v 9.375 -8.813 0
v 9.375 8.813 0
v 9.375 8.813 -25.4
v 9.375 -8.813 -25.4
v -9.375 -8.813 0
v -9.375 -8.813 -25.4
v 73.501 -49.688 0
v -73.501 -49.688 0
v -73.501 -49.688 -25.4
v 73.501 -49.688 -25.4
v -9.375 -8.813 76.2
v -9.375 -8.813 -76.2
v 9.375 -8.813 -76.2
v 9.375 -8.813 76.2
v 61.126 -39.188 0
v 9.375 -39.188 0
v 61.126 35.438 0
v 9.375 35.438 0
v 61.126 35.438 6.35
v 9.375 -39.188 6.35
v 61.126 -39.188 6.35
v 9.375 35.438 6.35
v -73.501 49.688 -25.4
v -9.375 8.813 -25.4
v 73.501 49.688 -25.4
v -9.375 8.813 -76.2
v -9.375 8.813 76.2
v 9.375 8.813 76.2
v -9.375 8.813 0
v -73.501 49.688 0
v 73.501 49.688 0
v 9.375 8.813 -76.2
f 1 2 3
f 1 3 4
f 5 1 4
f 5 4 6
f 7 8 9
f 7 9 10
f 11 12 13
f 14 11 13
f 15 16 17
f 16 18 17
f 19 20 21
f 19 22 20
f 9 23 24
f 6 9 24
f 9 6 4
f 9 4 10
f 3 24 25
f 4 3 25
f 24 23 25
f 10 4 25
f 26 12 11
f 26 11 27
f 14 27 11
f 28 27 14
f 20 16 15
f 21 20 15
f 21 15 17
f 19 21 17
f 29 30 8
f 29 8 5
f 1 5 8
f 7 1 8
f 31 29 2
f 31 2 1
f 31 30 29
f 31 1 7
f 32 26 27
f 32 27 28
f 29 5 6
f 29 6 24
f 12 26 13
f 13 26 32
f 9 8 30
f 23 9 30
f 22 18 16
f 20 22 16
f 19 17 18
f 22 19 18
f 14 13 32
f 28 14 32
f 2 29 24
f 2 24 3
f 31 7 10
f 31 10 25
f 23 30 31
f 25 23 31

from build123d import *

# Parameters (mm, degrees)
F0_W     = 147.001236
F0_H     = 99.37583
F1_DEPTH = 25.4
F0_W_2   = 18.750162
F0_H_2   = 17.62514
F2_DEPTH = 76.2
F3_DEPTH = 6.35


with BuildPart() as f1:
    # F0 (on Top) → F1 (new body)
    with BuildSketch(Plane.XY):
        Rectangle(F0_W, F0_H)
        Polygon((9.375081, -39.187826), (9.375081, -8.81257), (-9.375081, -8.81257), (-9.375081, 8.81257), (9.375081, 8.81257), (9.375081, 35.4378), (61.125513, 35.4378), (61.125513, -39.187826), align=None, mode=Mode.SUBTRACT)
        Polygon((9.375081, 8.81257), (9.375081, -8.81257), (9.375081, -39.187826), (61.125513, -39.187826), (61.125513, 35.4378), (9.375081, 35.4378), align=None)
    extrude(amount=-F1_DEPTH)


with BuildPart() as f2:
    # F0 (on Top) → F2 (new body, symmetric)
    with BuildSketch(Plane.XY):
        Rectangle(F0_W_2, F0_H_2)
    extrude(amount=F2_DEPTH, both=True)


with BuildPart() as f3:
    # F0 (on Top) → F3 (new body)
    with BuildSketch(Plane.XY):
        Polygon((9.375081, 8.81257), (9.375081, -8.81257), (9.375081, -39.187826), (61.125513, -39.187826), (61.125513, 35.4378), (9.375081, 35.4378), align=None)
    extrude(amount=F3_DEPTH)


solid = Compound([f1.part, f2.part, f3.part])
